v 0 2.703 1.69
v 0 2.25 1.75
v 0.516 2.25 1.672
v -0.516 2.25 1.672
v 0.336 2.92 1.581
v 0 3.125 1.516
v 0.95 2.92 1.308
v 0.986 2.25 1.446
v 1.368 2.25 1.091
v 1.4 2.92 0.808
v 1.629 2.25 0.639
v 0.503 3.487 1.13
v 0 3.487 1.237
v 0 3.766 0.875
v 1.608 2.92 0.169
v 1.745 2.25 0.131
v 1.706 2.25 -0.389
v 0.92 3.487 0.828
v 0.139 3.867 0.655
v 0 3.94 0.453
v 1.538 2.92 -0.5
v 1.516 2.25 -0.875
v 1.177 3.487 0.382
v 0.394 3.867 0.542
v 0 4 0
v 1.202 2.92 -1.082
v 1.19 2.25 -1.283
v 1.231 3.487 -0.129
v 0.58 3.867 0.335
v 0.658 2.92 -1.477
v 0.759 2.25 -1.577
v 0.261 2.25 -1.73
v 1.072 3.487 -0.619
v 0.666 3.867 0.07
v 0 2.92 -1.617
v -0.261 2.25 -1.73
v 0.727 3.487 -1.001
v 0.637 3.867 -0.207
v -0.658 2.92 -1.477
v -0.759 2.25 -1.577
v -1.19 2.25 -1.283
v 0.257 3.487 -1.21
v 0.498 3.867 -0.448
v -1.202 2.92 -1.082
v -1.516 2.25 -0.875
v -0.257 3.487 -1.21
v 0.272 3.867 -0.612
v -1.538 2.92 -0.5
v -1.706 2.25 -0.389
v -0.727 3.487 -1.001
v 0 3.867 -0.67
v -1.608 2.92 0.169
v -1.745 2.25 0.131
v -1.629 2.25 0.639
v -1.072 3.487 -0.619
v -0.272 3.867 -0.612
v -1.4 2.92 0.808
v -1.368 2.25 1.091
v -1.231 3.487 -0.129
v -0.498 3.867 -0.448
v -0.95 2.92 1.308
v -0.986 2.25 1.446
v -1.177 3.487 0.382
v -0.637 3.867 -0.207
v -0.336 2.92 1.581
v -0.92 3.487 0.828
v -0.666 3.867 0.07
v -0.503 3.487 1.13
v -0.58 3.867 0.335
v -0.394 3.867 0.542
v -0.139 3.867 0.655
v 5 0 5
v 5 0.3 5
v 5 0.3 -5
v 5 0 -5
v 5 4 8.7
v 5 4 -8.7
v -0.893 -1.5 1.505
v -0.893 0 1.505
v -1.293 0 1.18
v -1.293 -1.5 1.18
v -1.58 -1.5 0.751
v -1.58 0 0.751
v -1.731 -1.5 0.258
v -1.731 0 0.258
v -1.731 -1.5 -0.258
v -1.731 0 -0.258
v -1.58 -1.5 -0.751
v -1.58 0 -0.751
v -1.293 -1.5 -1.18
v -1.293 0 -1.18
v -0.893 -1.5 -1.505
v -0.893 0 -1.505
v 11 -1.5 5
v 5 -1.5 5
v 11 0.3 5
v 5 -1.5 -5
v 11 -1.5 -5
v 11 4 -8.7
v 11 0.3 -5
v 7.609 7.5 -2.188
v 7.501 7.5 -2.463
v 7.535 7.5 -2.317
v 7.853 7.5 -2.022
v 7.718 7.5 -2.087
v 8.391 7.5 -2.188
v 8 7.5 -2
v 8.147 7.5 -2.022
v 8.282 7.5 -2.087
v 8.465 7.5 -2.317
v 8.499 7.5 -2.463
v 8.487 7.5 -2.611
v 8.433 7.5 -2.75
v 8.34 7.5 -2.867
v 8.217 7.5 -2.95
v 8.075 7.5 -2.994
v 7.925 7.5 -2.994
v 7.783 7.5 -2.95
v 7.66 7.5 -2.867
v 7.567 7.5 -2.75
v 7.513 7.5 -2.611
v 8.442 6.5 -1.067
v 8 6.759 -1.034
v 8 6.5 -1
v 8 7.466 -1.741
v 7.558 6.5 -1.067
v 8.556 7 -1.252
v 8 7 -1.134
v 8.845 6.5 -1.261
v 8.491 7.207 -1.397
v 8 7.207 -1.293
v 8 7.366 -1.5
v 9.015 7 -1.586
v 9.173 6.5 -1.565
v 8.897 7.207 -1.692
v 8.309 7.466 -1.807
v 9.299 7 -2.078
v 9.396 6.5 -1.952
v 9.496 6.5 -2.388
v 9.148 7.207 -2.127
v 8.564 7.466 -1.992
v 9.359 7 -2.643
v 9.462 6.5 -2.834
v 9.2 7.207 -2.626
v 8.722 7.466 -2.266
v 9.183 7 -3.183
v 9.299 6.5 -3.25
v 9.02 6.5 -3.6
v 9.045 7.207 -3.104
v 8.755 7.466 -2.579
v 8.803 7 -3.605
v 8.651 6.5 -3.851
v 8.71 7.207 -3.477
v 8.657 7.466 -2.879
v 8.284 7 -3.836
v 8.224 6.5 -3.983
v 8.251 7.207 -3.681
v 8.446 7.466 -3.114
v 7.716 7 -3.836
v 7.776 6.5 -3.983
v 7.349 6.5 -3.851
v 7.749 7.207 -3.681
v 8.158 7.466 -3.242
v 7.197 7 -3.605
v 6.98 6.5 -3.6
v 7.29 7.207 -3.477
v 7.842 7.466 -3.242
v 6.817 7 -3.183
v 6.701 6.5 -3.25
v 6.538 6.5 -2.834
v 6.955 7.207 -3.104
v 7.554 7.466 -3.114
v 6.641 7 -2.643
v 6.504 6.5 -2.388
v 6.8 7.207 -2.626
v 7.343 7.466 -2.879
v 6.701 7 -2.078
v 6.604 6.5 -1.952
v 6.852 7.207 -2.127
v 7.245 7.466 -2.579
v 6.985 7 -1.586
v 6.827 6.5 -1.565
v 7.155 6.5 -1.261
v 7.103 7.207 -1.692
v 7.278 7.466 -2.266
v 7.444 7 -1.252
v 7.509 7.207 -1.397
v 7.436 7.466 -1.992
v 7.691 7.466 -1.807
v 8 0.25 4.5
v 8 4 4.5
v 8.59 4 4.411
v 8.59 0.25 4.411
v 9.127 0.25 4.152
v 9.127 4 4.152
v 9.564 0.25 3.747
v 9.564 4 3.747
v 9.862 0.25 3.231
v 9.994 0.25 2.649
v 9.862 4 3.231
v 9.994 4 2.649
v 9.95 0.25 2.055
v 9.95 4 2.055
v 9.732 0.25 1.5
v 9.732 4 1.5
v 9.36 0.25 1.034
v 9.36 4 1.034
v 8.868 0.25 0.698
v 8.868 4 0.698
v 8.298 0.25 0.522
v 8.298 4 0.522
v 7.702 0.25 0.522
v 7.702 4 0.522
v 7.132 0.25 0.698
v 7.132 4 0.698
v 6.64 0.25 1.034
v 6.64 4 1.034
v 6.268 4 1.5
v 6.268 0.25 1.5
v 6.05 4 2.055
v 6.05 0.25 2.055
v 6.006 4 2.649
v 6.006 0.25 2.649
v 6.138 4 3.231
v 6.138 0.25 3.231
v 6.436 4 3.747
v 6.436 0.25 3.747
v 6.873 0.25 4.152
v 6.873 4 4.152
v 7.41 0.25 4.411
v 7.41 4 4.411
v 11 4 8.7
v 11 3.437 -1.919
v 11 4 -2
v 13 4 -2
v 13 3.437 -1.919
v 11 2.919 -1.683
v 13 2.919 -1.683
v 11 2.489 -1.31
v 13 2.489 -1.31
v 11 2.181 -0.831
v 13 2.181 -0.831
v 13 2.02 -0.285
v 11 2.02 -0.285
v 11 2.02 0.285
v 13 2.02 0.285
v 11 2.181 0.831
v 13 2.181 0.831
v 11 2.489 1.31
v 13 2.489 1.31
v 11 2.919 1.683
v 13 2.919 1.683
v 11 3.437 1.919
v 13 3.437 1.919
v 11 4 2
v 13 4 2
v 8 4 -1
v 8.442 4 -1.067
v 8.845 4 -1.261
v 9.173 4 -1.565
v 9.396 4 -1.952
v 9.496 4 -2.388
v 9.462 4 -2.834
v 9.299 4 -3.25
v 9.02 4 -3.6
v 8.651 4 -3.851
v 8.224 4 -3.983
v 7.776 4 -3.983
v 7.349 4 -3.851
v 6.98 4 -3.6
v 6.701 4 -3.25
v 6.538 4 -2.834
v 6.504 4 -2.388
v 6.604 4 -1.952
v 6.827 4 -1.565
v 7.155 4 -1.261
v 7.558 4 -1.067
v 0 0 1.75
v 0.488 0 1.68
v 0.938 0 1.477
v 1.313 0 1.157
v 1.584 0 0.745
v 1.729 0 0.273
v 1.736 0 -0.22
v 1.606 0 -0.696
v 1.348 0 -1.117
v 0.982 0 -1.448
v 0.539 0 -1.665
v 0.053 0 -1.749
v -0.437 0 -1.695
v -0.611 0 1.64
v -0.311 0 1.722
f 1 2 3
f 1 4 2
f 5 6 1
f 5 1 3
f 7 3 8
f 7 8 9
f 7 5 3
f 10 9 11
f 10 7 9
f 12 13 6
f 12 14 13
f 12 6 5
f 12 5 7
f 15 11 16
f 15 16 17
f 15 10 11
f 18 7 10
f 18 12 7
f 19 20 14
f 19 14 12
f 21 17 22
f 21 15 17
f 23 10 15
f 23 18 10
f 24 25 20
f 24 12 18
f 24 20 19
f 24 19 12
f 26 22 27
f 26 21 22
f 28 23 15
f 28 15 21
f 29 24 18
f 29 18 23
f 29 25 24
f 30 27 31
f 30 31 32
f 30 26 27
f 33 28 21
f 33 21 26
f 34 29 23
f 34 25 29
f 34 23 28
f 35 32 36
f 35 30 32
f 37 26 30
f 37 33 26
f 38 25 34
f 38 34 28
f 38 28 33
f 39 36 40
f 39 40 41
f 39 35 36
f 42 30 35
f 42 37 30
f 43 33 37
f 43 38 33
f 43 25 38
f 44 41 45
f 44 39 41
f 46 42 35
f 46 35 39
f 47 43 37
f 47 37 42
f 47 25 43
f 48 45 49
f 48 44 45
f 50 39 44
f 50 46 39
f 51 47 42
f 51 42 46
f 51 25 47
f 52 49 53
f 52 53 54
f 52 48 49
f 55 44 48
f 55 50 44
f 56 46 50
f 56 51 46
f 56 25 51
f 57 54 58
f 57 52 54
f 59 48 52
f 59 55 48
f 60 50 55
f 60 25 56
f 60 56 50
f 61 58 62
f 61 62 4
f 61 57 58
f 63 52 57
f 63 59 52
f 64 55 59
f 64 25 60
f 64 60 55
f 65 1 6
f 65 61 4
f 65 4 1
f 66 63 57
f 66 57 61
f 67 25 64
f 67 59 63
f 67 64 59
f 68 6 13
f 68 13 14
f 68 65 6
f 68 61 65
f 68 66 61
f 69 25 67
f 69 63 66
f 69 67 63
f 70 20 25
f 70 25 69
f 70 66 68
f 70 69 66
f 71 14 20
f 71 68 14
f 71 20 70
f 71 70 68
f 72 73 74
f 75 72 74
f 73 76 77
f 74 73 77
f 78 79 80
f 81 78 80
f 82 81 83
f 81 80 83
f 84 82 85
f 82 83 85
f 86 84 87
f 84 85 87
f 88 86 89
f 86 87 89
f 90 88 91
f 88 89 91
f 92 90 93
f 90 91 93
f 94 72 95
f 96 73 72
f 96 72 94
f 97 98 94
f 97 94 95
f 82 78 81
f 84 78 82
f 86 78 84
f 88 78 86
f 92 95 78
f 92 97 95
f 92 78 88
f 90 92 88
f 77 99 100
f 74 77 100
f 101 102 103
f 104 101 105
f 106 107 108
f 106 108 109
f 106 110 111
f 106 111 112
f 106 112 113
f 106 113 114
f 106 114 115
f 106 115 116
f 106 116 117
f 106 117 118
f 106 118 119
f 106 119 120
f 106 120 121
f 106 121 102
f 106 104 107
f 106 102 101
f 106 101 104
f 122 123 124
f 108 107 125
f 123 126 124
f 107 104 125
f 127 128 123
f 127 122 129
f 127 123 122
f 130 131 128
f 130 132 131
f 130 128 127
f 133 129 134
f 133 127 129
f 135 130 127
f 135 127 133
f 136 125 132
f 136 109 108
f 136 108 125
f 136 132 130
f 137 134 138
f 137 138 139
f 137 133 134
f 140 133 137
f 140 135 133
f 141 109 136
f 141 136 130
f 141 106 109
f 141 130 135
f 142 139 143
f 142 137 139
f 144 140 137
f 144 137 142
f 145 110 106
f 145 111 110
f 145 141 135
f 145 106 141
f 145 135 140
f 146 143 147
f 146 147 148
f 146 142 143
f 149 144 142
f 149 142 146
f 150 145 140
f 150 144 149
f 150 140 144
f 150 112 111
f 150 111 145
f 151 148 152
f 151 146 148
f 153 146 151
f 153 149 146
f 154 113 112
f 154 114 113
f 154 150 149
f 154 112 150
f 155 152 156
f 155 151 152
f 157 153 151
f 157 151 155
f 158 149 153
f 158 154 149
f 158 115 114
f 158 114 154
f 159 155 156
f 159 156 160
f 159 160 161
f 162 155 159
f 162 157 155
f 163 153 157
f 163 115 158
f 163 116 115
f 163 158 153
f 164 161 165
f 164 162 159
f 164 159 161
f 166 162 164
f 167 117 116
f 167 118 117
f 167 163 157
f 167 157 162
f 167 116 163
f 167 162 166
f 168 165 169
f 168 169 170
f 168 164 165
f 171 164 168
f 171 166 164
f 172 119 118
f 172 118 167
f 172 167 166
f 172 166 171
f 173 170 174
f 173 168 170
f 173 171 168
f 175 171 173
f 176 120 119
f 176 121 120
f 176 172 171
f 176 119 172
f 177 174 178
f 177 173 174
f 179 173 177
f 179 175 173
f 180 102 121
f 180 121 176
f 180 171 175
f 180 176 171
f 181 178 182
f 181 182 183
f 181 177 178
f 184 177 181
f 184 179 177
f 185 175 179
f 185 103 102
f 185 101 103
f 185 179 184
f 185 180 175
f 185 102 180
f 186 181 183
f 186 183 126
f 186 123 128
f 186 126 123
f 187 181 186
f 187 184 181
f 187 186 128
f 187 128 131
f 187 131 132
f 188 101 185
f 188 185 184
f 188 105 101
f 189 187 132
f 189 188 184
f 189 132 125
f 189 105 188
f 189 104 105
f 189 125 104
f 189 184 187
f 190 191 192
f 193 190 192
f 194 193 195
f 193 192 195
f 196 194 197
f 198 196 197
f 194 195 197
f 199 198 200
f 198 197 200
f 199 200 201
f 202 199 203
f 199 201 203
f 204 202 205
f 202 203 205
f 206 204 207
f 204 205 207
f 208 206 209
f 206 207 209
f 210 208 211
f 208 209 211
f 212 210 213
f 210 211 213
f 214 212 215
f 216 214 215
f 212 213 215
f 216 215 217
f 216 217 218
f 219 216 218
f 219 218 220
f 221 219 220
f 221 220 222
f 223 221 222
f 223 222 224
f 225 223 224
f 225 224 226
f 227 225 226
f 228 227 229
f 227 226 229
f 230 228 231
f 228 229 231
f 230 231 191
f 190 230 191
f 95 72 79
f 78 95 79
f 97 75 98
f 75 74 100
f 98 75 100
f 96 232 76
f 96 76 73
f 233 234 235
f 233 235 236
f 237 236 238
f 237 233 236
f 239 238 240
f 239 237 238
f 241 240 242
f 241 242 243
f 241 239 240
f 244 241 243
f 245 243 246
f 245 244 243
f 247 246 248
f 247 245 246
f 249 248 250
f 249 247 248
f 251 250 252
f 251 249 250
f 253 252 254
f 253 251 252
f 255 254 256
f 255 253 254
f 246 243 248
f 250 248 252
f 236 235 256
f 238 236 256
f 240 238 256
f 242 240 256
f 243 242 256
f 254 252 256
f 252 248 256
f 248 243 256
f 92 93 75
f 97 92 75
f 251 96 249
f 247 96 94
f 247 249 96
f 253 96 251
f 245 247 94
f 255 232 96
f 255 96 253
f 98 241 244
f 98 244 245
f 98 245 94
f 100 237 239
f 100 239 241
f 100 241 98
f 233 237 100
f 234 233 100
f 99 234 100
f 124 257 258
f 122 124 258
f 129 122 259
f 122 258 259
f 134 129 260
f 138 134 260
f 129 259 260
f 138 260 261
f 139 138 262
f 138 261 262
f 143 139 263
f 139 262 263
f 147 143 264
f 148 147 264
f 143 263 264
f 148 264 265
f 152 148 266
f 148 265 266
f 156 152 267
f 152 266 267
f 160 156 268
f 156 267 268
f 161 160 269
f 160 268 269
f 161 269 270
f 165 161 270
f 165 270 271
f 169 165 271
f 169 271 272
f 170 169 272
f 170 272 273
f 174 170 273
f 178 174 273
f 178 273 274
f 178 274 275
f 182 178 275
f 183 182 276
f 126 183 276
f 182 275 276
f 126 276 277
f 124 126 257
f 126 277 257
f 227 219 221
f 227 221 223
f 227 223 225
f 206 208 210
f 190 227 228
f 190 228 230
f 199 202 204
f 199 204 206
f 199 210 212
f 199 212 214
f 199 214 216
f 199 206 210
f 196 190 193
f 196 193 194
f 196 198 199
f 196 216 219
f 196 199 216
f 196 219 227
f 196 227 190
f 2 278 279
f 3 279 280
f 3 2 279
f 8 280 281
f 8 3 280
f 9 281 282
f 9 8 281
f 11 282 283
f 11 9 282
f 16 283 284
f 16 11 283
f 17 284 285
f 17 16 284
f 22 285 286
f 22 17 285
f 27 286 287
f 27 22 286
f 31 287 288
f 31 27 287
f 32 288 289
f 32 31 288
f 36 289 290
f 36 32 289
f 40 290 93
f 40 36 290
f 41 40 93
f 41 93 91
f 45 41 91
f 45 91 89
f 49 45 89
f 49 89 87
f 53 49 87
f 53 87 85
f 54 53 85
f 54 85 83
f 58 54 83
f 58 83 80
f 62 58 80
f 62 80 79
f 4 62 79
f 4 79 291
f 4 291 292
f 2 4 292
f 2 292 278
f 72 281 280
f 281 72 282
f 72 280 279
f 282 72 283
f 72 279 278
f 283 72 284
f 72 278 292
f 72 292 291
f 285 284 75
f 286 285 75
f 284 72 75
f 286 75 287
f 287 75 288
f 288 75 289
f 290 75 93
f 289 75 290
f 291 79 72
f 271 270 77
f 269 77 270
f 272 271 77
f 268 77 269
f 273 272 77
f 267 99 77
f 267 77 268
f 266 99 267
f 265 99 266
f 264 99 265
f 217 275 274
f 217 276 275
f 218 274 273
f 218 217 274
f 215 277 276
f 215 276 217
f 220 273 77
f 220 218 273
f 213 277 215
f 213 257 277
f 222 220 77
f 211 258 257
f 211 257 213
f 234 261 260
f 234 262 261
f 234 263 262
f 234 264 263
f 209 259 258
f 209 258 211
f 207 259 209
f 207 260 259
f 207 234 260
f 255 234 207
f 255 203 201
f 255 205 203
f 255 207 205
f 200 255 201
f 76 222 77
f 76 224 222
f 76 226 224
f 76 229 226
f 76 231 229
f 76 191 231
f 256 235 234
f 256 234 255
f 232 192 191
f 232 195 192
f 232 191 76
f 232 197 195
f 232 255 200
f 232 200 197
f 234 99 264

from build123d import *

# Parameters (mm, degrees)
BOSS_EXTRUDE1_DEPTH = 1.5
BOSS_EXTRUDE2_START = 4
SKETCH2_R           = 1.75
SKETCH2_W           = 6
SKETCH2_H           = 10
BOSS_EXTRUDE2_DEPTH = 4
FILLET1_R           = 1.75
SKETCH4_R           = 1.5
BOSS_EXTRUDE4_DEPTH = 3.5
FILLET2_R           = 1
SKETCH5_R           = 2
CUT_EXTRUDE1_DEPTH  = 3.75
BOSS_EXTRUDE5_DEPTH = 2
BOSS_EXTRUDE6_DEPTH = 6


with BuildPart() as part:
    # Sketch1 → Boss-Extrude1 (new body)
    with BuildSketch(Plane(origin=(0, 0, 0), x_dir=(1, 0, 0), z_dir=(0, 1, 0))):
        with BuildLine():
            Line((5, 5), (11, 5))
            Line((11, 5), (11, -5))
            Line((11, -5), (5, -5))
            Line((5, -5), (-0.892691591, -1.505191591))
            ThreePointArc((-0.892691591, -1.505191591), (-1.75, 0), (-0.892691591, 1.505191591))
            Line((-0.892691591, 1.505191591), (5, 5))
        make_face()
    extrude(amount=-BOSS_EXTRUDE1_DEPTH)

    # Sketch2 → Boss-Extrude2 (add)
    with BuildSketch(Plane(origin=(0, 0, 0), x_dir=(1, 0, 0), z_dir=(0, 1, 0)).offset(BOSS_EXTRUDE2_START)):
        with Locations(Location((0, 0, 0), (0, 0, 270))):
            Circle(SKETCH2_R)
        with Locations((8, 0)):
            Rectangle(SKETCH2_W, SKETCH2_H)
    extrude(amount=-BOSS_EXTRUDE2_DEPTH)

    # Fillet1
    fillet1_edges = [part.edges().sort_by_distance(p)[0] for p in [
        (0, 4, -1.75),
    ]]
    fillet(fillet1_edges, radius=FILLET1_R)

    # Sketch4 → Boss-Extrude4 (add)
    with BuildSketch(Plane(origin=(0, 4, 0), x_dir=(1, 0, 0), z_dir=(0, 1, 0))):
        with Locations(Location((8, 2.5, 0), (0, 0, 270))):
            Circle(SKETCH4_R)
    extrude(amount=BOSS_EXTRUDE4_DEPTH)

    # Fillet2
    fillet2_edges = [part.edges().sort_by_distance(p)[0] for p in [
        (8, 7.5, -4),
    ]]
    fillet(fillet2_edges, radius=FILLET2_R)

    # Sketch5 → Cut-Extrude1 (cut)
    with BuildSketch(Plane(origin=(0, 4, 0), x_dir=(1, 0, 0), z_dir=(0, 1, 0))):
        with Locations(Location((8, -2.5, 0), (0, 0, 270))):
            Circle(SKETCH5_R)
    extrude(amount=-CUT_EXTRUDE1_DEPTH, mode=Mode.SUBTRACT)

    # Sketch6 → Boss-Extrude5 (add)
    with BuildSketch(Plane(origin=(11, 0, 0), x_dir=(0, 0, -1), z_dir=(1, 0, 0))):
        with BuildLine():
            Line((-2, 4), (2, 4))
            ThreePointArc((2, 4), (0, 2), (-2, 4))
        make_face()
    extrude(amount=BOSS_EXTRUDE5_DEPTH)

    # Sketch9 → Boss-Extrude6 (add)
    with BuildSketch(Plane(origin=(11, 0, 0), x_dir=(0, 0, -1), z_dir=(1, 0, 0))):
        Polygon((-5, 4), (-8.7, 4), (-5, 0.3), align=None)
        Polygon((5, 0.3), (5, 4), (8.7, 4), align=None)
    extrude(amount=-BOSS_EXTRUDE6_DEPTH)


solid = part.part
